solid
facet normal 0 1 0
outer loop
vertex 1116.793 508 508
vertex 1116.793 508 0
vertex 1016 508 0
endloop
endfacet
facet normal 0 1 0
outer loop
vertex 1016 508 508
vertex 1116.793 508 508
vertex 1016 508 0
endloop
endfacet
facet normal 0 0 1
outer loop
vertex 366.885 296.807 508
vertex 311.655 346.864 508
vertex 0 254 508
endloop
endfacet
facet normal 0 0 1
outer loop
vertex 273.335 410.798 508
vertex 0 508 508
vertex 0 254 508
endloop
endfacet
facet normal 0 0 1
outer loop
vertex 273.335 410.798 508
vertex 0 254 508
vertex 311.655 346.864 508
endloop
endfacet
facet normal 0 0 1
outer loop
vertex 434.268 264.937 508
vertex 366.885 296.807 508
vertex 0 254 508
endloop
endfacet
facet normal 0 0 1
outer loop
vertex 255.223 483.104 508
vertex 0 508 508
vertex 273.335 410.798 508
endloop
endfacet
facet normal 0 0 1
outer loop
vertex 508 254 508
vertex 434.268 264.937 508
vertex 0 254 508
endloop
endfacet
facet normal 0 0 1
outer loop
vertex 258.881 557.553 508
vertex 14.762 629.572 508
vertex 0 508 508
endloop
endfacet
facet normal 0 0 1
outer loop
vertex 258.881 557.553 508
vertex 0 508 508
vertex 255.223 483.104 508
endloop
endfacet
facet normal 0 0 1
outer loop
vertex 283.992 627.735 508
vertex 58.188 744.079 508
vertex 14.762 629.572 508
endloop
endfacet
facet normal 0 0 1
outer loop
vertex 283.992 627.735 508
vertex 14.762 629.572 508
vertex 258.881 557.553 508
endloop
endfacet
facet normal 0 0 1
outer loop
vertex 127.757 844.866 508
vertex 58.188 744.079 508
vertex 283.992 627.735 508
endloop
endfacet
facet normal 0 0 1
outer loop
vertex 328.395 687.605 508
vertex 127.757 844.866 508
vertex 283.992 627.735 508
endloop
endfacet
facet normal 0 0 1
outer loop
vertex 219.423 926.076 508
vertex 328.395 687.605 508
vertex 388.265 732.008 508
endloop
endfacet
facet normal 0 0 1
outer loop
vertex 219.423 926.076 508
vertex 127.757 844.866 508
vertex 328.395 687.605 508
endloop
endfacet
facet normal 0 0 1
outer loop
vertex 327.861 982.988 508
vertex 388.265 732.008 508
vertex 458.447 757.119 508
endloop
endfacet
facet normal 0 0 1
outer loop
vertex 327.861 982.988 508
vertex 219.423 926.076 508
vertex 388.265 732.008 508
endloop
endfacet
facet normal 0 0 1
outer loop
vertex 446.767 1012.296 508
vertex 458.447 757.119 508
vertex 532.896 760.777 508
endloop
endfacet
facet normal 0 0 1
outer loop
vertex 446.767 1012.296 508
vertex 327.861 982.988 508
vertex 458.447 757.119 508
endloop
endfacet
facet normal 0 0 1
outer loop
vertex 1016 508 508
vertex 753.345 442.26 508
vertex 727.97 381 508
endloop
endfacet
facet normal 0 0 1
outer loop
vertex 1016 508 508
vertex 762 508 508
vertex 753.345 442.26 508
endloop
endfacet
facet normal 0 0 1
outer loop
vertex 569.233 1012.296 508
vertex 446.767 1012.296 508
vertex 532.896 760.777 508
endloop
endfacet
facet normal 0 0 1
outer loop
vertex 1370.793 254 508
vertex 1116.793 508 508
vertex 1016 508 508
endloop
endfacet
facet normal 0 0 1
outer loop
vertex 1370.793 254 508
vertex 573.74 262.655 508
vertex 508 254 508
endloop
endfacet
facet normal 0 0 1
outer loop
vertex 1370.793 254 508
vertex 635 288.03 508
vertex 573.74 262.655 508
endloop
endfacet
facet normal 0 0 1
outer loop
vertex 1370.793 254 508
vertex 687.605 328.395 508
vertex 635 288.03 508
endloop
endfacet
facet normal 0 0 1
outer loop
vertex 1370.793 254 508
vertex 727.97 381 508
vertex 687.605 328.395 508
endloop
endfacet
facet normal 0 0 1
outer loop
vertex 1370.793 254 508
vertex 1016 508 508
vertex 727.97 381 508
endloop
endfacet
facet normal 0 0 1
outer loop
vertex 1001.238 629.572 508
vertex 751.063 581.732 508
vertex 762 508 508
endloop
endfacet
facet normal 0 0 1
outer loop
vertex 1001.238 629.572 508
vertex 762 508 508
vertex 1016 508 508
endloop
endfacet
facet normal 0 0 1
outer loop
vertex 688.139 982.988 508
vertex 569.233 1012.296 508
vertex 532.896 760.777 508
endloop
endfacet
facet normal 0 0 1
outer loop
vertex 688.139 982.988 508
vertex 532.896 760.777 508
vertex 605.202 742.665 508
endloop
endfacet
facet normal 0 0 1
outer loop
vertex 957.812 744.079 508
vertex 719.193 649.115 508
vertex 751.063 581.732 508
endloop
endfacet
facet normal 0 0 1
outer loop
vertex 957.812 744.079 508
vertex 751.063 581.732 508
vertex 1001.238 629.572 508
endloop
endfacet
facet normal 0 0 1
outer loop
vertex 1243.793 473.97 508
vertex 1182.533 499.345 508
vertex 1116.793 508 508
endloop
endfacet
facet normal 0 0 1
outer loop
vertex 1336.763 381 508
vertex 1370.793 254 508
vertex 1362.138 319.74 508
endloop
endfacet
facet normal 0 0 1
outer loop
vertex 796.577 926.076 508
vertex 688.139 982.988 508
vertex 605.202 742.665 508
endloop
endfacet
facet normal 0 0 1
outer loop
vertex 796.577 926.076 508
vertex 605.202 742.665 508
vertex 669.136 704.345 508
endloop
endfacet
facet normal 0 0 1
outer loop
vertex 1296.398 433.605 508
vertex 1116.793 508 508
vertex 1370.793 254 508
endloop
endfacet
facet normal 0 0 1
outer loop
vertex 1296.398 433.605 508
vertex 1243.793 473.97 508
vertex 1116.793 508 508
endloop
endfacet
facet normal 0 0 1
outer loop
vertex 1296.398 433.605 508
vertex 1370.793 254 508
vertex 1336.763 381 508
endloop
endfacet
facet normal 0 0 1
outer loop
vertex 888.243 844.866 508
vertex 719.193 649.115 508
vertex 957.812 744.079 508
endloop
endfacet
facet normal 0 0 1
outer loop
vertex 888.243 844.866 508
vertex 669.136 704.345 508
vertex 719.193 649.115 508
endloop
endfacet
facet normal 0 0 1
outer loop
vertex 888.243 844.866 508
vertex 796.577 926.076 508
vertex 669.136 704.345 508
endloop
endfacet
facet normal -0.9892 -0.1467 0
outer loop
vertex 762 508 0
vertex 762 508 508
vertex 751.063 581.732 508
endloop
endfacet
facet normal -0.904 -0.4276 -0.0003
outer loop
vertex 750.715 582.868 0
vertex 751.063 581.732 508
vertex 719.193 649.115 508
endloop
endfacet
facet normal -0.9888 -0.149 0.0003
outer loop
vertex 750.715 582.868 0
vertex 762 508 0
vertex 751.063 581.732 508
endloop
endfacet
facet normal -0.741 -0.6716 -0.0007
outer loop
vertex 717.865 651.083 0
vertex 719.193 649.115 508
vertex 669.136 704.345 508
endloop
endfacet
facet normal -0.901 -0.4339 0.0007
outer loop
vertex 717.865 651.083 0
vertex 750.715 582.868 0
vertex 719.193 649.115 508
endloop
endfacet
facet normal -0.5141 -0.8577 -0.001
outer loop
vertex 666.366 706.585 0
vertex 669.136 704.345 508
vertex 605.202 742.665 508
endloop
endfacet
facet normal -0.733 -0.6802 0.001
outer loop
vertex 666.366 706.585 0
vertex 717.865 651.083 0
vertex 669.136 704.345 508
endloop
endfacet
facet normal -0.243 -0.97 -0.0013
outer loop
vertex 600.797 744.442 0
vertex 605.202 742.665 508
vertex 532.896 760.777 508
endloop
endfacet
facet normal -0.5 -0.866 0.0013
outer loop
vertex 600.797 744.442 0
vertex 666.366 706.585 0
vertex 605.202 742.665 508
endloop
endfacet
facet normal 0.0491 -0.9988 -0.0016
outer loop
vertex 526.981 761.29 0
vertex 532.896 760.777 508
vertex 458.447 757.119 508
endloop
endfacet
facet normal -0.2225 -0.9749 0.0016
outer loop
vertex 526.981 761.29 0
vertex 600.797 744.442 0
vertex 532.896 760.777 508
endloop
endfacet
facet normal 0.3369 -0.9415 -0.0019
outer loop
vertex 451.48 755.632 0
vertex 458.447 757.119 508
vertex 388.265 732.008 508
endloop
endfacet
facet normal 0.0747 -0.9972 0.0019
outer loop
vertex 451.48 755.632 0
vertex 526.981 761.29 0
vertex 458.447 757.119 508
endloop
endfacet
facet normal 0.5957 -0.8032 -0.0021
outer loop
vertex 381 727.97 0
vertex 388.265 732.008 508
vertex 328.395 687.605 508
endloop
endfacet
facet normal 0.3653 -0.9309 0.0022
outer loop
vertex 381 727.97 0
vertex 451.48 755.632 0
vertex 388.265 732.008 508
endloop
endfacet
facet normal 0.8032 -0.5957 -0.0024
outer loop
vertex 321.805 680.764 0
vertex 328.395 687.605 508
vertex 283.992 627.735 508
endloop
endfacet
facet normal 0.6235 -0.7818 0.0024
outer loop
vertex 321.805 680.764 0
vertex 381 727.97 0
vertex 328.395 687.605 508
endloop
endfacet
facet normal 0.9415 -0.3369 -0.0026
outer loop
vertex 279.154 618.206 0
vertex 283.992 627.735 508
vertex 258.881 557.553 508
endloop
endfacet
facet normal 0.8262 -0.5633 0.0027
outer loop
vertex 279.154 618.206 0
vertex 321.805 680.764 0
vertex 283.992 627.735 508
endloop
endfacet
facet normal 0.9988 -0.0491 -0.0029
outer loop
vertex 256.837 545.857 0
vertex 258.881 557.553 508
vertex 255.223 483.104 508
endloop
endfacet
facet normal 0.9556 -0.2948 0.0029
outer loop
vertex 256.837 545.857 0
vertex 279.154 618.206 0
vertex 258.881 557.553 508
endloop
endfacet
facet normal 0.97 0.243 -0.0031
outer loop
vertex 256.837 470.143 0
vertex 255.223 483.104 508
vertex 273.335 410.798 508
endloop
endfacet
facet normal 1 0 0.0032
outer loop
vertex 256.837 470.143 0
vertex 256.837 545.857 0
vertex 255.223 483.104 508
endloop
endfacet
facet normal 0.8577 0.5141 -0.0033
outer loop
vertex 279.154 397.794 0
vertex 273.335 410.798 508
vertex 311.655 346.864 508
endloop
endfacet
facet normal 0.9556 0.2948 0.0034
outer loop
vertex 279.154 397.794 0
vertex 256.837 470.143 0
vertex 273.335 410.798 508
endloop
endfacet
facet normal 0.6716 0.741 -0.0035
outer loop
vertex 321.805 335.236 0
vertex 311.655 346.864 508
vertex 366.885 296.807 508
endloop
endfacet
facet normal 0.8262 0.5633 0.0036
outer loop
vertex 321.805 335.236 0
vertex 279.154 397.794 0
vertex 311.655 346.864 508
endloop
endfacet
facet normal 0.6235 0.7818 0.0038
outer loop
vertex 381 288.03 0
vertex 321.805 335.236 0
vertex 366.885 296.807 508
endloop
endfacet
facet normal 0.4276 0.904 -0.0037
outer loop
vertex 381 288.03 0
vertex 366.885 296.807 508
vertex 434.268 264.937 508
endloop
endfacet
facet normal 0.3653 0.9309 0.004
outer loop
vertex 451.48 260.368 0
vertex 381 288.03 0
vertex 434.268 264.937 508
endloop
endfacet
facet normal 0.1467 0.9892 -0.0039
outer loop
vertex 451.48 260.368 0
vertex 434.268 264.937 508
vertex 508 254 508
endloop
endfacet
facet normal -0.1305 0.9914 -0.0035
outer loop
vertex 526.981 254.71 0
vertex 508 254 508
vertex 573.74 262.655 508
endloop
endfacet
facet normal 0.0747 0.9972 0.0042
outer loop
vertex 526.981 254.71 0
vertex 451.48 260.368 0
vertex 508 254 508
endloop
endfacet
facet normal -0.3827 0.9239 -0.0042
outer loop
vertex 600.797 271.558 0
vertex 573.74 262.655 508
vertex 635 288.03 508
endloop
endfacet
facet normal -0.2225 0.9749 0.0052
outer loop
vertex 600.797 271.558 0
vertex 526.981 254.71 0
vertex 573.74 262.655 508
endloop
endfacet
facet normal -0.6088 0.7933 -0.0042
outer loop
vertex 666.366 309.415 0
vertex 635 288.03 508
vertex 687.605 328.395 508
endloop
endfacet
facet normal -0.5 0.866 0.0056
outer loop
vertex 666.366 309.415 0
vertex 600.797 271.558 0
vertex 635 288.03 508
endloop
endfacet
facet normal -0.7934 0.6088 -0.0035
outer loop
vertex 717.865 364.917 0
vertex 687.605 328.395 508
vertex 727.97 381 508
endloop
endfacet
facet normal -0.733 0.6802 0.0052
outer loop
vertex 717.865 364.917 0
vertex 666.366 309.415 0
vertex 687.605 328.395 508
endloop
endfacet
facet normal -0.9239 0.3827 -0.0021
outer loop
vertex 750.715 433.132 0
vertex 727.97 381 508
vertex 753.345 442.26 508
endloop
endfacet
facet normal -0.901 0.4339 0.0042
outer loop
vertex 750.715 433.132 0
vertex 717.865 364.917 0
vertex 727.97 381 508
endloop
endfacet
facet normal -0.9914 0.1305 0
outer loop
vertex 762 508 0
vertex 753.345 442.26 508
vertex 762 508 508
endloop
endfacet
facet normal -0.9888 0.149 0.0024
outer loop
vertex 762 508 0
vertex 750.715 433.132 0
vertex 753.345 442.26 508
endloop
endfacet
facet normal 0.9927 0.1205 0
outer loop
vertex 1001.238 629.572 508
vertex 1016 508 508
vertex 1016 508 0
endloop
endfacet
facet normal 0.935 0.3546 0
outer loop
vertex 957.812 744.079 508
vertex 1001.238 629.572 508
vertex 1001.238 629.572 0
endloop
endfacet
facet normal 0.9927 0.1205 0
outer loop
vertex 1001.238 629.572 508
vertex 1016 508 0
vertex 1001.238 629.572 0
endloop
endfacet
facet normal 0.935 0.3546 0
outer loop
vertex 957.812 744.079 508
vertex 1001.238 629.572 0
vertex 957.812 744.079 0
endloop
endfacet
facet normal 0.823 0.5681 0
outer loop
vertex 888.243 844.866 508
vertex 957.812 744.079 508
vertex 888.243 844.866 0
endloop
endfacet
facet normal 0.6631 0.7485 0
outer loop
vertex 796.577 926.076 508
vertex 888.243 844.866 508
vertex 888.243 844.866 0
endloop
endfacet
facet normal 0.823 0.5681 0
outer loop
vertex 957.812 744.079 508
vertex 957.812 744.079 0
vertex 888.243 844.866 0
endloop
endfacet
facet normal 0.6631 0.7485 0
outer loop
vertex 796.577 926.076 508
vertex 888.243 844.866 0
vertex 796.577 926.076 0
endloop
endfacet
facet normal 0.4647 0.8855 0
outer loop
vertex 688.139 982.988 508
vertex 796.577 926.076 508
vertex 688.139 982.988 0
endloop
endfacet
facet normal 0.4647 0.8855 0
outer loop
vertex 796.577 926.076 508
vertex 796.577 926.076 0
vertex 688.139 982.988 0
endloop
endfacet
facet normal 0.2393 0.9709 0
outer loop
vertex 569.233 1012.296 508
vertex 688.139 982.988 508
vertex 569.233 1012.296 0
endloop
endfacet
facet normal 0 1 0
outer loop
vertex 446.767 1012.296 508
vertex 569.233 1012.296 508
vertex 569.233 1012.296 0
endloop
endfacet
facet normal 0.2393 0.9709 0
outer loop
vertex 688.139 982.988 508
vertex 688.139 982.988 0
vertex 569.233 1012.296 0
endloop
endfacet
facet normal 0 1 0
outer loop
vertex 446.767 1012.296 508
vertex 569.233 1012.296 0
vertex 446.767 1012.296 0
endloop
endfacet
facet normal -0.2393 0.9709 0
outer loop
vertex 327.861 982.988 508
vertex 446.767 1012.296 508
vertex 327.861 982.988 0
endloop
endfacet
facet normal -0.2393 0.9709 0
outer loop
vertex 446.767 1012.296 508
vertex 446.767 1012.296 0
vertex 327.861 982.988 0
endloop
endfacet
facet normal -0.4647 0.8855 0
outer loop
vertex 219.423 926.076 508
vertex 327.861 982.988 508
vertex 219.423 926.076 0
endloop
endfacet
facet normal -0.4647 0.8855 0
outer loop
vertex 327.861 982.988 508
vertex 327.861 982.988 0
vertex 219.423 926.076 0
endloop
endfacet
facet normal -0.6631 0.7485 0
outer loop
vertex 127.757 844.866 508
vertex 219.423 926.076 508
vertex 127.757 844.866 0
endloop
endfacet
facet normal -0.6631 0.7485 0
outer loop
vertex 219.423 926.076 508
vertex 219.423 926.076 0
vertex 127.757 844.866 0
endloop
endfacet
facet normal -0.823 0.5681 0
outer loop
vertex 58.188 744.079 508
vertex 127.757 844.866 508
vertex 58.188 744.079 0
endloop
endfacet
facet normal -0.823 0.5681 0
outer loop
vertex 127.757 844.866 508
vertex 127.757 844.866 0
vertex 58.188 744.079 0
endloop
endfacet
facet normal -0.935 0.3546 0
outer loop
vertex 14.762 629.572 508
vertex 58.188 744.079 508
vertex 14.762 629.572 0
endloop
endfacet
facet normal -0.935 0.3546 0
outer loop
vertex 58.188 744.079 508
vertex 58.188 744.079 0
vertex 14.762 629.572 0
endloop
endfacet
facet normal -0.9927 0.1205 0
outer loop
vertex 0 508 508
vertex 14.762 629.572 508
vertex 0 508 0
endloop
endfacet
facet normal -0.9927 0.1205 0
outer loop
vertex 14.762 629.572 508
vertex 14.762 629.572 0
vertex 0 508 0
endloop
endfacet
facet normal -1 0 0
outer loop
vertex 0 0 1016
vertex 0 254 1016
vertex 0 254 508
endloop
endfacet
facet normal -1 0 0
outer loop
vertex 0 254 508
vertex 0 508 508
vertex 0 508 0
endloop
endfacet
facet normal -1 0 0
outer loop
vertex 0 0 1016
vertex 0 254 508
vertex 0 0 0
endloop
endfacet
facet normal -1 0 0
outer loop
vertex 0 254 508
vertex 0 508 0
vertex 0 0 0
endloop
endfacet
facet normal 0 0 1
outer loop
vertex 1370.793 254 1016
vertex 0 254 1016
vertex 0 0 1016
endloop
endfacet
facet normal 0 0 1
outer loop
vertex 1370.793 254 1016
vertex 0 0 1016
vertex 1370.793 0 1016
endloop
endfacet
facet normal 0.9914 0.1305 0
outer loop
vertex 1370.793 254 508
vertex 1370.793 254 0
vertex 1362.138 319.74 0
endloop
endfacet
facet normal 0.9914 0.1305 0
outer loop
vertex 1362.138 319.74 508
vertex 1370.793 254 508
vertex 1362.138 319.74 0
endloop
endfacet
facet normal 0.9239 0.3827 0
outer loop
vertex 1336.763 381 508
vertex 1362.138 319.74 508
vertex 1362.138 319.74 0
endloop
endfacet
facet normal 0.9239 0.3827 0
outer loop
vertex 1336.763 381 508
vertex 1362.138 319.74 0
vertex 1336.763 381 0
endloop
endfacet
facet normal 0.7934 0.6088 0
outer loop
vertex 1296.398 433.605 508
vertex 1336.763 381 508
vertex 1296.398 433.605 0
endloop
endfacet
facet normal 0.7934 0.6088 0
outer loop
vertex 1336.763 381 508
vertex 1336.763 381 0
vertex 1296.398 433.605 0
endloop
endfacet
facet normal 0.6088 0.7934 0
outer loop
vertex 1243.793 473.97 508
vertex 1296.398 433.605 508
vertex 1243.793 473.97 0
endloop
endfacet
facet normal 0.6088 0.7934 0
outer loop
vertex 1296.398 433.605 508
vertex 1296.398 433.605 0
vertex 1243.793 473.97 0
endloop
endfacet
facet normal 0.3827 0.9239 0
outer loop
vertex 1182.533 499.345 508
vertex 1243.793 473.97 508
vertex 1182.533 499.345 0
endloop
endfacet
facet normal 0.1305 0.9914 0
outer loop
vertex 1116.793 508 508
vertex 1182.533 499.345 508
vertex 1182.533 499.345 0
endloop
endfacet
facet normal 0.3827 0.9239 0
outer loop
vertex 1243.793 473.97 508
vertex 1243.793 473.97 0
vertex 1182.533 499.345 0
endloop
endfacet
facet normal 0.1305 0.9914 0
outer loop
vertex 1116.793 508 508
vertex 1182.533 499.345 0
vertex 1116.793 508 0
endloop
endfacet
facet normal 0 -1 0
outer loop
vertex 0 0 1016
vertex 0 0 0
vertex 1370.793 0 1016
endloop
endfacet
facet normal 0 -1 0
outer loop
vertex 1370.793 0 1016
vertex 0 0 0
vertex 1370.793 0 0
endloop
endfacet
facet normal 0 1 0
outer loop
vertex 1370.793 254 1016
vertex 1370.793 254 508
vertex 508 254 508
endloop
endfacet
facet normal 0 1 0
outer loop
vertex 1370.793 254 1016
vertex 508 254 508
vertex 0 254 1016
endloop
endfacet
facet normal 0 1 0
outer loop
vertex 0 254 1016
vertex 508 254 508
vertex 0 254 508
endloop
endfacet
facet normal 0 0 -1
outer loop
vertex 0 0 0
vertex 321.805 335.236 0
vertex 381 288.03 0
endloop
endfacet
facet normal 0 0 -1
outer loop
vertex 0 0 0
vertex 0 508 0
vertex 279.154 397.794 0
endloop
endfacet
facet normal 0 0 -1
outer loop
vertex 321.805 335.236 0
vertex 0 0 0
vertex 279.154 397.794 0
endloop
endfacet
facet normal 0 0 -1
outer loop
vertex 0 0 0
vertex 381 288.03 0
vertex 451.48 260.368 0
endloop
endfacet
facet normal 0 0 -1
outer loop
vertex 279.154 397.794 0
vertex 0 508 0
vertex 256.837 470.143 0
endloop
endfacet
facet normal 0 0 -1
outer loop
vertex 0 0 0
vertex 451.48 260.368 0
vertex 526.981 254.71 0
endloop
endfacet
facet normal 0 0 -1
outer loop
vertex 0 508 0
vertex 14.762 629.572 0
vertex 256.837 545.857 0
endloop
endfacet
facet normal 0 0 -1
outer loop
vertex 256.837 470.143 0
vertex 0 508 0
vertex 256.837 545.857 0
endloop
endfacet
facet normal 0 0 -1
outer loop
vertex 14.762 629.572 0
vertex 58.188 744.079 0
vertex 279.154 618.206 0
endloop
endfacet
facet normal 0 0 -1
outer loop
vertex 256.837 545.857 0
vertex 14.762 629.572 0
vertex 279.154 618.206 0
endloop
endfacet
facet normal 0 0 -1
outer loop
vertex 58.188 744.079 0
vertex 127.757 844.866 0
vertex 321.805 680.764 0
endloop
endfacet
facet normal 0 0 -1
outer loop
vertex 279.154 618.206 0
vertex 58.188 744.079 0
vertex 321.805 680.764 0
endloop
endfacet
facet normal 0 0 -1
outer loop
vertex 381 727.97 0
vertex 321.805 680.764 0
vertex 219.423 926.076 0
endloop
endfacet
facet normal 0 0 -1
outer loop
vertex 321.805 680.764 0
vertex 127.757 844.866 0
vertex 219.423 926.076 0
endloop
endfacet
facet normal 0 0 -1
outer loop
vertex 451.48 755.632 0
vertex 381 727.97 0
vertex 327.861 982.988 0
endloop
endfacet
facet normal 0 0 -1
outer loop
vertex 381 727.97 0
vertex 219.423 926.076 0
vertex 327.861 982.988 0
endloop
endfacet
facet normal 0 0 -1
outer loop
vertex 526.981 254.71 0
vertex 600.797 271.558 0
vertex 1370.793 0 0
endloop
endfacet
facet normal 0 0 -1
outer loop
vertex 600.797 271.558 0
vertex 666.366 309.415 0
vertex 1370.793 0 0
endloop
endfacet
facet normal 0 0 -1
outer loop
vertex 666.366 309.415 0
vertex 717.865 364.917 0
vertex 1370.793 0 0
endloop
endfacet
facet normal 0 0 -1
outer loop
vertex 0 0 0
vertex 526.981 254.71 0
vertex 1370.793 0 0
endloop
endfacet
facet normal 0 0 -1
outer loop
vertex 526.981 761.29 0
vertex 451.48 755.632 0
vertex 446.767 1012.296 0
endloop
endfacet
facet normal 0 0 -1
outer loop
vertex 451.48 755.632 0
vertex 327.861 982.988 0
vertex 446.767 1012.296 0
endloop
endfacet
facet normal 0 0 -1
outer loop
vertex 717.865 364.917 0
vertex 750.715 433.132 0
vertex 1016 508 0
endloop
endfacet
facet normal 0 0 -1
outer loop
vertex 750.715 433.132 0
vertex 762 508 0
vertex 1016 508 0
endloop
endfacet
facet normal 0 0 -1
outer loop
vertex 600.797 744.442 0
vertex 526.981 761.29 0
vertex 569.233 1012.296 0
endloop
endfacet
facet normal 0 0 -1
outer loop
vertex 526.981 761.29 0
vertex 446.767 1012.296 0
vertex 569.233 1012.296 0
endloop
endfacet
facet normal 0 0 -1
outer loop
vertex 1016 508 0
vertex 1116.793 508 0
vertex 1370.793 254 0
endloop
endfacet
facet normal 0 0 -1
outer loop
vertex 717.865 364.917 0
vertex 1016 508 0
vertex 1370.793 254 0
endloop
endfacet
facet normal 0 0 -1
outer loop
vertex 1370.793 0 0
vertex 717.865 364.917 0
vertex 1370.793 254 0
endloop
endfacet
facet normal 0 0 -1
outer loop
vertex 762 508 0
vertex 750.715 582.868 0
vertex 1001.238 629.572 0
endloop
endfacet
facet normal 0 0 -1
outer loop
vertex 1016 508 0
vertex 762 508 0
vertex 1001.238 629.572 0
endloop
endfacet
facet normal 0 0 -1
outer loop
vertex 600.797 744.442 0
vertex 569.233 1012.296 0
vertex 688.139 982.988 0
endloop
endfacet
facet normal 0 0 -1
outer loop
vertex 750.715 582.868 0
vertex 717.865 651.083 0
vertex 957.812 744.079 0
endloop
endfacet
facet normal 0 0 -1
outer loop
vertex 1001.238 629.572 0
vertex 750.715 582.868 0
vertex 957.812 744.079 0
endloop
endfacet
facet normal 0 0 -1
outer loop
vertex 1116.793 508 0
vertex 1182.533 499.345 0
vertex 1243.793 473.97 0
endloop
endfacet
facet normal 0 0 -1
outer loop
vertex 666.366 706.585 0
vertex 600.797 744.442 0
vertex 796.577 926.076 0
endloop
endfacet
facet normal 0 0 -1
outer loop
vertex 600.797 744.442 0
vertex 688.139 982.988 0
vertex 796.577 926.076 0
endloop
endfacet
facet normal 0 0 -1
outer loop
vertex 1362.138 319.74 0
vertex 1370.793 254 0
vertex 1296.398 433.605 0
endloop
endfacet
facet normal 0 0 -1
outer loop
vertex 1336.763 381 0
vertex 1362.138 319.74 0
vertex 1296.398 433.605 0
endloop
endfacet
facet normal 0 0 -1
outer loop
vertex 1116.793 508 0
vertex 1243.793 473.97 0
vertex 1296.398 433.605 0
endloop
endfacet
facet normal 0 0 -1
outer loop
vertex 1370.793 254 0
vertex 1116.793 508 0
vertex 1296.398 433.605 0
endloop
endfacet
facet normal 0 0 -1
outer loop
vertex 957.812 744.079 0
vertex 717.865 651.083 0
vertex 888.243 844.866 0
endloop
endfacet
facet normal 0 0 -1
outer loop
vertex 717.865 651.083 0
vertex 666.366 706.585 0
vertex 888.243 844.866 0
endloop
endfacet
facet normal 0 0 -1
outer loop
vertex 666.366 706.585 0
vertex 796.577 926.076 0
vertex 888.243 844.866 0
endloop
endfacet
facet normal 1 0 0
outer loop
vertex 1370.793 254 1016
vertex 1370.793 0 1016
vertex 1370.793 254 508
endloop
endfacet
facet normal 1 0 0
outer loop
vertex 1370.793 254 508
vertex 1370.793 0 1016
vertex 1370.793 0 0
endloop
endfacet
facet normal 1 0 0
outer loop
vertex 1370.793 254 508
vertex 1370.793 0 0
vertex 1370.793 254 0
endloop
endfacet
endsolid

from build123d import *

# Parameters (mm, degrees)
SKETCH1_R           = 254
BOSS_EXTRUDE1_DEPTH = 508
BOSS_EXTRUDE2_DEPTH = 1016


with BuildPart() as part:
    # Sketch1 → Boss-Extrude1 (new body)
    with BuildSketch(Plane.XY):
        with BuildLine():
            Line((0, 0), (1370.792512001, 0))
            Line((1370.792512001, 0), (1370.792512001, 254))
            ThreePointArc((1370.792512001, 254), (1296.397634423, 433.605122421), (1116.792512001, 508))
            Line((1116.792512001, 508), (1016, 508))
            ThreePointArc((1016, 508), (508, 1016), (0, 508))
            Line((0, 508), (0, 0))
        make_face()
        with Locations((508, 508)):
            Circle(SKETCH1_R, mode=Mode.SUBTRACT)
    extrude(amount=BOSS_EXTRUDE1_DEPTH)

    # Sketch1<4> → Boss-Extrude2 (add)
    with BuildSketch(Plane.XY):
        Polygon((0, 254), (0, 0), (1370.792512001, 0), (1370.792512001, 254), (508, 254), align=None)
    extrude(amount=BOSS_EXTRUDE2_DEPTH)


solid = part.part
